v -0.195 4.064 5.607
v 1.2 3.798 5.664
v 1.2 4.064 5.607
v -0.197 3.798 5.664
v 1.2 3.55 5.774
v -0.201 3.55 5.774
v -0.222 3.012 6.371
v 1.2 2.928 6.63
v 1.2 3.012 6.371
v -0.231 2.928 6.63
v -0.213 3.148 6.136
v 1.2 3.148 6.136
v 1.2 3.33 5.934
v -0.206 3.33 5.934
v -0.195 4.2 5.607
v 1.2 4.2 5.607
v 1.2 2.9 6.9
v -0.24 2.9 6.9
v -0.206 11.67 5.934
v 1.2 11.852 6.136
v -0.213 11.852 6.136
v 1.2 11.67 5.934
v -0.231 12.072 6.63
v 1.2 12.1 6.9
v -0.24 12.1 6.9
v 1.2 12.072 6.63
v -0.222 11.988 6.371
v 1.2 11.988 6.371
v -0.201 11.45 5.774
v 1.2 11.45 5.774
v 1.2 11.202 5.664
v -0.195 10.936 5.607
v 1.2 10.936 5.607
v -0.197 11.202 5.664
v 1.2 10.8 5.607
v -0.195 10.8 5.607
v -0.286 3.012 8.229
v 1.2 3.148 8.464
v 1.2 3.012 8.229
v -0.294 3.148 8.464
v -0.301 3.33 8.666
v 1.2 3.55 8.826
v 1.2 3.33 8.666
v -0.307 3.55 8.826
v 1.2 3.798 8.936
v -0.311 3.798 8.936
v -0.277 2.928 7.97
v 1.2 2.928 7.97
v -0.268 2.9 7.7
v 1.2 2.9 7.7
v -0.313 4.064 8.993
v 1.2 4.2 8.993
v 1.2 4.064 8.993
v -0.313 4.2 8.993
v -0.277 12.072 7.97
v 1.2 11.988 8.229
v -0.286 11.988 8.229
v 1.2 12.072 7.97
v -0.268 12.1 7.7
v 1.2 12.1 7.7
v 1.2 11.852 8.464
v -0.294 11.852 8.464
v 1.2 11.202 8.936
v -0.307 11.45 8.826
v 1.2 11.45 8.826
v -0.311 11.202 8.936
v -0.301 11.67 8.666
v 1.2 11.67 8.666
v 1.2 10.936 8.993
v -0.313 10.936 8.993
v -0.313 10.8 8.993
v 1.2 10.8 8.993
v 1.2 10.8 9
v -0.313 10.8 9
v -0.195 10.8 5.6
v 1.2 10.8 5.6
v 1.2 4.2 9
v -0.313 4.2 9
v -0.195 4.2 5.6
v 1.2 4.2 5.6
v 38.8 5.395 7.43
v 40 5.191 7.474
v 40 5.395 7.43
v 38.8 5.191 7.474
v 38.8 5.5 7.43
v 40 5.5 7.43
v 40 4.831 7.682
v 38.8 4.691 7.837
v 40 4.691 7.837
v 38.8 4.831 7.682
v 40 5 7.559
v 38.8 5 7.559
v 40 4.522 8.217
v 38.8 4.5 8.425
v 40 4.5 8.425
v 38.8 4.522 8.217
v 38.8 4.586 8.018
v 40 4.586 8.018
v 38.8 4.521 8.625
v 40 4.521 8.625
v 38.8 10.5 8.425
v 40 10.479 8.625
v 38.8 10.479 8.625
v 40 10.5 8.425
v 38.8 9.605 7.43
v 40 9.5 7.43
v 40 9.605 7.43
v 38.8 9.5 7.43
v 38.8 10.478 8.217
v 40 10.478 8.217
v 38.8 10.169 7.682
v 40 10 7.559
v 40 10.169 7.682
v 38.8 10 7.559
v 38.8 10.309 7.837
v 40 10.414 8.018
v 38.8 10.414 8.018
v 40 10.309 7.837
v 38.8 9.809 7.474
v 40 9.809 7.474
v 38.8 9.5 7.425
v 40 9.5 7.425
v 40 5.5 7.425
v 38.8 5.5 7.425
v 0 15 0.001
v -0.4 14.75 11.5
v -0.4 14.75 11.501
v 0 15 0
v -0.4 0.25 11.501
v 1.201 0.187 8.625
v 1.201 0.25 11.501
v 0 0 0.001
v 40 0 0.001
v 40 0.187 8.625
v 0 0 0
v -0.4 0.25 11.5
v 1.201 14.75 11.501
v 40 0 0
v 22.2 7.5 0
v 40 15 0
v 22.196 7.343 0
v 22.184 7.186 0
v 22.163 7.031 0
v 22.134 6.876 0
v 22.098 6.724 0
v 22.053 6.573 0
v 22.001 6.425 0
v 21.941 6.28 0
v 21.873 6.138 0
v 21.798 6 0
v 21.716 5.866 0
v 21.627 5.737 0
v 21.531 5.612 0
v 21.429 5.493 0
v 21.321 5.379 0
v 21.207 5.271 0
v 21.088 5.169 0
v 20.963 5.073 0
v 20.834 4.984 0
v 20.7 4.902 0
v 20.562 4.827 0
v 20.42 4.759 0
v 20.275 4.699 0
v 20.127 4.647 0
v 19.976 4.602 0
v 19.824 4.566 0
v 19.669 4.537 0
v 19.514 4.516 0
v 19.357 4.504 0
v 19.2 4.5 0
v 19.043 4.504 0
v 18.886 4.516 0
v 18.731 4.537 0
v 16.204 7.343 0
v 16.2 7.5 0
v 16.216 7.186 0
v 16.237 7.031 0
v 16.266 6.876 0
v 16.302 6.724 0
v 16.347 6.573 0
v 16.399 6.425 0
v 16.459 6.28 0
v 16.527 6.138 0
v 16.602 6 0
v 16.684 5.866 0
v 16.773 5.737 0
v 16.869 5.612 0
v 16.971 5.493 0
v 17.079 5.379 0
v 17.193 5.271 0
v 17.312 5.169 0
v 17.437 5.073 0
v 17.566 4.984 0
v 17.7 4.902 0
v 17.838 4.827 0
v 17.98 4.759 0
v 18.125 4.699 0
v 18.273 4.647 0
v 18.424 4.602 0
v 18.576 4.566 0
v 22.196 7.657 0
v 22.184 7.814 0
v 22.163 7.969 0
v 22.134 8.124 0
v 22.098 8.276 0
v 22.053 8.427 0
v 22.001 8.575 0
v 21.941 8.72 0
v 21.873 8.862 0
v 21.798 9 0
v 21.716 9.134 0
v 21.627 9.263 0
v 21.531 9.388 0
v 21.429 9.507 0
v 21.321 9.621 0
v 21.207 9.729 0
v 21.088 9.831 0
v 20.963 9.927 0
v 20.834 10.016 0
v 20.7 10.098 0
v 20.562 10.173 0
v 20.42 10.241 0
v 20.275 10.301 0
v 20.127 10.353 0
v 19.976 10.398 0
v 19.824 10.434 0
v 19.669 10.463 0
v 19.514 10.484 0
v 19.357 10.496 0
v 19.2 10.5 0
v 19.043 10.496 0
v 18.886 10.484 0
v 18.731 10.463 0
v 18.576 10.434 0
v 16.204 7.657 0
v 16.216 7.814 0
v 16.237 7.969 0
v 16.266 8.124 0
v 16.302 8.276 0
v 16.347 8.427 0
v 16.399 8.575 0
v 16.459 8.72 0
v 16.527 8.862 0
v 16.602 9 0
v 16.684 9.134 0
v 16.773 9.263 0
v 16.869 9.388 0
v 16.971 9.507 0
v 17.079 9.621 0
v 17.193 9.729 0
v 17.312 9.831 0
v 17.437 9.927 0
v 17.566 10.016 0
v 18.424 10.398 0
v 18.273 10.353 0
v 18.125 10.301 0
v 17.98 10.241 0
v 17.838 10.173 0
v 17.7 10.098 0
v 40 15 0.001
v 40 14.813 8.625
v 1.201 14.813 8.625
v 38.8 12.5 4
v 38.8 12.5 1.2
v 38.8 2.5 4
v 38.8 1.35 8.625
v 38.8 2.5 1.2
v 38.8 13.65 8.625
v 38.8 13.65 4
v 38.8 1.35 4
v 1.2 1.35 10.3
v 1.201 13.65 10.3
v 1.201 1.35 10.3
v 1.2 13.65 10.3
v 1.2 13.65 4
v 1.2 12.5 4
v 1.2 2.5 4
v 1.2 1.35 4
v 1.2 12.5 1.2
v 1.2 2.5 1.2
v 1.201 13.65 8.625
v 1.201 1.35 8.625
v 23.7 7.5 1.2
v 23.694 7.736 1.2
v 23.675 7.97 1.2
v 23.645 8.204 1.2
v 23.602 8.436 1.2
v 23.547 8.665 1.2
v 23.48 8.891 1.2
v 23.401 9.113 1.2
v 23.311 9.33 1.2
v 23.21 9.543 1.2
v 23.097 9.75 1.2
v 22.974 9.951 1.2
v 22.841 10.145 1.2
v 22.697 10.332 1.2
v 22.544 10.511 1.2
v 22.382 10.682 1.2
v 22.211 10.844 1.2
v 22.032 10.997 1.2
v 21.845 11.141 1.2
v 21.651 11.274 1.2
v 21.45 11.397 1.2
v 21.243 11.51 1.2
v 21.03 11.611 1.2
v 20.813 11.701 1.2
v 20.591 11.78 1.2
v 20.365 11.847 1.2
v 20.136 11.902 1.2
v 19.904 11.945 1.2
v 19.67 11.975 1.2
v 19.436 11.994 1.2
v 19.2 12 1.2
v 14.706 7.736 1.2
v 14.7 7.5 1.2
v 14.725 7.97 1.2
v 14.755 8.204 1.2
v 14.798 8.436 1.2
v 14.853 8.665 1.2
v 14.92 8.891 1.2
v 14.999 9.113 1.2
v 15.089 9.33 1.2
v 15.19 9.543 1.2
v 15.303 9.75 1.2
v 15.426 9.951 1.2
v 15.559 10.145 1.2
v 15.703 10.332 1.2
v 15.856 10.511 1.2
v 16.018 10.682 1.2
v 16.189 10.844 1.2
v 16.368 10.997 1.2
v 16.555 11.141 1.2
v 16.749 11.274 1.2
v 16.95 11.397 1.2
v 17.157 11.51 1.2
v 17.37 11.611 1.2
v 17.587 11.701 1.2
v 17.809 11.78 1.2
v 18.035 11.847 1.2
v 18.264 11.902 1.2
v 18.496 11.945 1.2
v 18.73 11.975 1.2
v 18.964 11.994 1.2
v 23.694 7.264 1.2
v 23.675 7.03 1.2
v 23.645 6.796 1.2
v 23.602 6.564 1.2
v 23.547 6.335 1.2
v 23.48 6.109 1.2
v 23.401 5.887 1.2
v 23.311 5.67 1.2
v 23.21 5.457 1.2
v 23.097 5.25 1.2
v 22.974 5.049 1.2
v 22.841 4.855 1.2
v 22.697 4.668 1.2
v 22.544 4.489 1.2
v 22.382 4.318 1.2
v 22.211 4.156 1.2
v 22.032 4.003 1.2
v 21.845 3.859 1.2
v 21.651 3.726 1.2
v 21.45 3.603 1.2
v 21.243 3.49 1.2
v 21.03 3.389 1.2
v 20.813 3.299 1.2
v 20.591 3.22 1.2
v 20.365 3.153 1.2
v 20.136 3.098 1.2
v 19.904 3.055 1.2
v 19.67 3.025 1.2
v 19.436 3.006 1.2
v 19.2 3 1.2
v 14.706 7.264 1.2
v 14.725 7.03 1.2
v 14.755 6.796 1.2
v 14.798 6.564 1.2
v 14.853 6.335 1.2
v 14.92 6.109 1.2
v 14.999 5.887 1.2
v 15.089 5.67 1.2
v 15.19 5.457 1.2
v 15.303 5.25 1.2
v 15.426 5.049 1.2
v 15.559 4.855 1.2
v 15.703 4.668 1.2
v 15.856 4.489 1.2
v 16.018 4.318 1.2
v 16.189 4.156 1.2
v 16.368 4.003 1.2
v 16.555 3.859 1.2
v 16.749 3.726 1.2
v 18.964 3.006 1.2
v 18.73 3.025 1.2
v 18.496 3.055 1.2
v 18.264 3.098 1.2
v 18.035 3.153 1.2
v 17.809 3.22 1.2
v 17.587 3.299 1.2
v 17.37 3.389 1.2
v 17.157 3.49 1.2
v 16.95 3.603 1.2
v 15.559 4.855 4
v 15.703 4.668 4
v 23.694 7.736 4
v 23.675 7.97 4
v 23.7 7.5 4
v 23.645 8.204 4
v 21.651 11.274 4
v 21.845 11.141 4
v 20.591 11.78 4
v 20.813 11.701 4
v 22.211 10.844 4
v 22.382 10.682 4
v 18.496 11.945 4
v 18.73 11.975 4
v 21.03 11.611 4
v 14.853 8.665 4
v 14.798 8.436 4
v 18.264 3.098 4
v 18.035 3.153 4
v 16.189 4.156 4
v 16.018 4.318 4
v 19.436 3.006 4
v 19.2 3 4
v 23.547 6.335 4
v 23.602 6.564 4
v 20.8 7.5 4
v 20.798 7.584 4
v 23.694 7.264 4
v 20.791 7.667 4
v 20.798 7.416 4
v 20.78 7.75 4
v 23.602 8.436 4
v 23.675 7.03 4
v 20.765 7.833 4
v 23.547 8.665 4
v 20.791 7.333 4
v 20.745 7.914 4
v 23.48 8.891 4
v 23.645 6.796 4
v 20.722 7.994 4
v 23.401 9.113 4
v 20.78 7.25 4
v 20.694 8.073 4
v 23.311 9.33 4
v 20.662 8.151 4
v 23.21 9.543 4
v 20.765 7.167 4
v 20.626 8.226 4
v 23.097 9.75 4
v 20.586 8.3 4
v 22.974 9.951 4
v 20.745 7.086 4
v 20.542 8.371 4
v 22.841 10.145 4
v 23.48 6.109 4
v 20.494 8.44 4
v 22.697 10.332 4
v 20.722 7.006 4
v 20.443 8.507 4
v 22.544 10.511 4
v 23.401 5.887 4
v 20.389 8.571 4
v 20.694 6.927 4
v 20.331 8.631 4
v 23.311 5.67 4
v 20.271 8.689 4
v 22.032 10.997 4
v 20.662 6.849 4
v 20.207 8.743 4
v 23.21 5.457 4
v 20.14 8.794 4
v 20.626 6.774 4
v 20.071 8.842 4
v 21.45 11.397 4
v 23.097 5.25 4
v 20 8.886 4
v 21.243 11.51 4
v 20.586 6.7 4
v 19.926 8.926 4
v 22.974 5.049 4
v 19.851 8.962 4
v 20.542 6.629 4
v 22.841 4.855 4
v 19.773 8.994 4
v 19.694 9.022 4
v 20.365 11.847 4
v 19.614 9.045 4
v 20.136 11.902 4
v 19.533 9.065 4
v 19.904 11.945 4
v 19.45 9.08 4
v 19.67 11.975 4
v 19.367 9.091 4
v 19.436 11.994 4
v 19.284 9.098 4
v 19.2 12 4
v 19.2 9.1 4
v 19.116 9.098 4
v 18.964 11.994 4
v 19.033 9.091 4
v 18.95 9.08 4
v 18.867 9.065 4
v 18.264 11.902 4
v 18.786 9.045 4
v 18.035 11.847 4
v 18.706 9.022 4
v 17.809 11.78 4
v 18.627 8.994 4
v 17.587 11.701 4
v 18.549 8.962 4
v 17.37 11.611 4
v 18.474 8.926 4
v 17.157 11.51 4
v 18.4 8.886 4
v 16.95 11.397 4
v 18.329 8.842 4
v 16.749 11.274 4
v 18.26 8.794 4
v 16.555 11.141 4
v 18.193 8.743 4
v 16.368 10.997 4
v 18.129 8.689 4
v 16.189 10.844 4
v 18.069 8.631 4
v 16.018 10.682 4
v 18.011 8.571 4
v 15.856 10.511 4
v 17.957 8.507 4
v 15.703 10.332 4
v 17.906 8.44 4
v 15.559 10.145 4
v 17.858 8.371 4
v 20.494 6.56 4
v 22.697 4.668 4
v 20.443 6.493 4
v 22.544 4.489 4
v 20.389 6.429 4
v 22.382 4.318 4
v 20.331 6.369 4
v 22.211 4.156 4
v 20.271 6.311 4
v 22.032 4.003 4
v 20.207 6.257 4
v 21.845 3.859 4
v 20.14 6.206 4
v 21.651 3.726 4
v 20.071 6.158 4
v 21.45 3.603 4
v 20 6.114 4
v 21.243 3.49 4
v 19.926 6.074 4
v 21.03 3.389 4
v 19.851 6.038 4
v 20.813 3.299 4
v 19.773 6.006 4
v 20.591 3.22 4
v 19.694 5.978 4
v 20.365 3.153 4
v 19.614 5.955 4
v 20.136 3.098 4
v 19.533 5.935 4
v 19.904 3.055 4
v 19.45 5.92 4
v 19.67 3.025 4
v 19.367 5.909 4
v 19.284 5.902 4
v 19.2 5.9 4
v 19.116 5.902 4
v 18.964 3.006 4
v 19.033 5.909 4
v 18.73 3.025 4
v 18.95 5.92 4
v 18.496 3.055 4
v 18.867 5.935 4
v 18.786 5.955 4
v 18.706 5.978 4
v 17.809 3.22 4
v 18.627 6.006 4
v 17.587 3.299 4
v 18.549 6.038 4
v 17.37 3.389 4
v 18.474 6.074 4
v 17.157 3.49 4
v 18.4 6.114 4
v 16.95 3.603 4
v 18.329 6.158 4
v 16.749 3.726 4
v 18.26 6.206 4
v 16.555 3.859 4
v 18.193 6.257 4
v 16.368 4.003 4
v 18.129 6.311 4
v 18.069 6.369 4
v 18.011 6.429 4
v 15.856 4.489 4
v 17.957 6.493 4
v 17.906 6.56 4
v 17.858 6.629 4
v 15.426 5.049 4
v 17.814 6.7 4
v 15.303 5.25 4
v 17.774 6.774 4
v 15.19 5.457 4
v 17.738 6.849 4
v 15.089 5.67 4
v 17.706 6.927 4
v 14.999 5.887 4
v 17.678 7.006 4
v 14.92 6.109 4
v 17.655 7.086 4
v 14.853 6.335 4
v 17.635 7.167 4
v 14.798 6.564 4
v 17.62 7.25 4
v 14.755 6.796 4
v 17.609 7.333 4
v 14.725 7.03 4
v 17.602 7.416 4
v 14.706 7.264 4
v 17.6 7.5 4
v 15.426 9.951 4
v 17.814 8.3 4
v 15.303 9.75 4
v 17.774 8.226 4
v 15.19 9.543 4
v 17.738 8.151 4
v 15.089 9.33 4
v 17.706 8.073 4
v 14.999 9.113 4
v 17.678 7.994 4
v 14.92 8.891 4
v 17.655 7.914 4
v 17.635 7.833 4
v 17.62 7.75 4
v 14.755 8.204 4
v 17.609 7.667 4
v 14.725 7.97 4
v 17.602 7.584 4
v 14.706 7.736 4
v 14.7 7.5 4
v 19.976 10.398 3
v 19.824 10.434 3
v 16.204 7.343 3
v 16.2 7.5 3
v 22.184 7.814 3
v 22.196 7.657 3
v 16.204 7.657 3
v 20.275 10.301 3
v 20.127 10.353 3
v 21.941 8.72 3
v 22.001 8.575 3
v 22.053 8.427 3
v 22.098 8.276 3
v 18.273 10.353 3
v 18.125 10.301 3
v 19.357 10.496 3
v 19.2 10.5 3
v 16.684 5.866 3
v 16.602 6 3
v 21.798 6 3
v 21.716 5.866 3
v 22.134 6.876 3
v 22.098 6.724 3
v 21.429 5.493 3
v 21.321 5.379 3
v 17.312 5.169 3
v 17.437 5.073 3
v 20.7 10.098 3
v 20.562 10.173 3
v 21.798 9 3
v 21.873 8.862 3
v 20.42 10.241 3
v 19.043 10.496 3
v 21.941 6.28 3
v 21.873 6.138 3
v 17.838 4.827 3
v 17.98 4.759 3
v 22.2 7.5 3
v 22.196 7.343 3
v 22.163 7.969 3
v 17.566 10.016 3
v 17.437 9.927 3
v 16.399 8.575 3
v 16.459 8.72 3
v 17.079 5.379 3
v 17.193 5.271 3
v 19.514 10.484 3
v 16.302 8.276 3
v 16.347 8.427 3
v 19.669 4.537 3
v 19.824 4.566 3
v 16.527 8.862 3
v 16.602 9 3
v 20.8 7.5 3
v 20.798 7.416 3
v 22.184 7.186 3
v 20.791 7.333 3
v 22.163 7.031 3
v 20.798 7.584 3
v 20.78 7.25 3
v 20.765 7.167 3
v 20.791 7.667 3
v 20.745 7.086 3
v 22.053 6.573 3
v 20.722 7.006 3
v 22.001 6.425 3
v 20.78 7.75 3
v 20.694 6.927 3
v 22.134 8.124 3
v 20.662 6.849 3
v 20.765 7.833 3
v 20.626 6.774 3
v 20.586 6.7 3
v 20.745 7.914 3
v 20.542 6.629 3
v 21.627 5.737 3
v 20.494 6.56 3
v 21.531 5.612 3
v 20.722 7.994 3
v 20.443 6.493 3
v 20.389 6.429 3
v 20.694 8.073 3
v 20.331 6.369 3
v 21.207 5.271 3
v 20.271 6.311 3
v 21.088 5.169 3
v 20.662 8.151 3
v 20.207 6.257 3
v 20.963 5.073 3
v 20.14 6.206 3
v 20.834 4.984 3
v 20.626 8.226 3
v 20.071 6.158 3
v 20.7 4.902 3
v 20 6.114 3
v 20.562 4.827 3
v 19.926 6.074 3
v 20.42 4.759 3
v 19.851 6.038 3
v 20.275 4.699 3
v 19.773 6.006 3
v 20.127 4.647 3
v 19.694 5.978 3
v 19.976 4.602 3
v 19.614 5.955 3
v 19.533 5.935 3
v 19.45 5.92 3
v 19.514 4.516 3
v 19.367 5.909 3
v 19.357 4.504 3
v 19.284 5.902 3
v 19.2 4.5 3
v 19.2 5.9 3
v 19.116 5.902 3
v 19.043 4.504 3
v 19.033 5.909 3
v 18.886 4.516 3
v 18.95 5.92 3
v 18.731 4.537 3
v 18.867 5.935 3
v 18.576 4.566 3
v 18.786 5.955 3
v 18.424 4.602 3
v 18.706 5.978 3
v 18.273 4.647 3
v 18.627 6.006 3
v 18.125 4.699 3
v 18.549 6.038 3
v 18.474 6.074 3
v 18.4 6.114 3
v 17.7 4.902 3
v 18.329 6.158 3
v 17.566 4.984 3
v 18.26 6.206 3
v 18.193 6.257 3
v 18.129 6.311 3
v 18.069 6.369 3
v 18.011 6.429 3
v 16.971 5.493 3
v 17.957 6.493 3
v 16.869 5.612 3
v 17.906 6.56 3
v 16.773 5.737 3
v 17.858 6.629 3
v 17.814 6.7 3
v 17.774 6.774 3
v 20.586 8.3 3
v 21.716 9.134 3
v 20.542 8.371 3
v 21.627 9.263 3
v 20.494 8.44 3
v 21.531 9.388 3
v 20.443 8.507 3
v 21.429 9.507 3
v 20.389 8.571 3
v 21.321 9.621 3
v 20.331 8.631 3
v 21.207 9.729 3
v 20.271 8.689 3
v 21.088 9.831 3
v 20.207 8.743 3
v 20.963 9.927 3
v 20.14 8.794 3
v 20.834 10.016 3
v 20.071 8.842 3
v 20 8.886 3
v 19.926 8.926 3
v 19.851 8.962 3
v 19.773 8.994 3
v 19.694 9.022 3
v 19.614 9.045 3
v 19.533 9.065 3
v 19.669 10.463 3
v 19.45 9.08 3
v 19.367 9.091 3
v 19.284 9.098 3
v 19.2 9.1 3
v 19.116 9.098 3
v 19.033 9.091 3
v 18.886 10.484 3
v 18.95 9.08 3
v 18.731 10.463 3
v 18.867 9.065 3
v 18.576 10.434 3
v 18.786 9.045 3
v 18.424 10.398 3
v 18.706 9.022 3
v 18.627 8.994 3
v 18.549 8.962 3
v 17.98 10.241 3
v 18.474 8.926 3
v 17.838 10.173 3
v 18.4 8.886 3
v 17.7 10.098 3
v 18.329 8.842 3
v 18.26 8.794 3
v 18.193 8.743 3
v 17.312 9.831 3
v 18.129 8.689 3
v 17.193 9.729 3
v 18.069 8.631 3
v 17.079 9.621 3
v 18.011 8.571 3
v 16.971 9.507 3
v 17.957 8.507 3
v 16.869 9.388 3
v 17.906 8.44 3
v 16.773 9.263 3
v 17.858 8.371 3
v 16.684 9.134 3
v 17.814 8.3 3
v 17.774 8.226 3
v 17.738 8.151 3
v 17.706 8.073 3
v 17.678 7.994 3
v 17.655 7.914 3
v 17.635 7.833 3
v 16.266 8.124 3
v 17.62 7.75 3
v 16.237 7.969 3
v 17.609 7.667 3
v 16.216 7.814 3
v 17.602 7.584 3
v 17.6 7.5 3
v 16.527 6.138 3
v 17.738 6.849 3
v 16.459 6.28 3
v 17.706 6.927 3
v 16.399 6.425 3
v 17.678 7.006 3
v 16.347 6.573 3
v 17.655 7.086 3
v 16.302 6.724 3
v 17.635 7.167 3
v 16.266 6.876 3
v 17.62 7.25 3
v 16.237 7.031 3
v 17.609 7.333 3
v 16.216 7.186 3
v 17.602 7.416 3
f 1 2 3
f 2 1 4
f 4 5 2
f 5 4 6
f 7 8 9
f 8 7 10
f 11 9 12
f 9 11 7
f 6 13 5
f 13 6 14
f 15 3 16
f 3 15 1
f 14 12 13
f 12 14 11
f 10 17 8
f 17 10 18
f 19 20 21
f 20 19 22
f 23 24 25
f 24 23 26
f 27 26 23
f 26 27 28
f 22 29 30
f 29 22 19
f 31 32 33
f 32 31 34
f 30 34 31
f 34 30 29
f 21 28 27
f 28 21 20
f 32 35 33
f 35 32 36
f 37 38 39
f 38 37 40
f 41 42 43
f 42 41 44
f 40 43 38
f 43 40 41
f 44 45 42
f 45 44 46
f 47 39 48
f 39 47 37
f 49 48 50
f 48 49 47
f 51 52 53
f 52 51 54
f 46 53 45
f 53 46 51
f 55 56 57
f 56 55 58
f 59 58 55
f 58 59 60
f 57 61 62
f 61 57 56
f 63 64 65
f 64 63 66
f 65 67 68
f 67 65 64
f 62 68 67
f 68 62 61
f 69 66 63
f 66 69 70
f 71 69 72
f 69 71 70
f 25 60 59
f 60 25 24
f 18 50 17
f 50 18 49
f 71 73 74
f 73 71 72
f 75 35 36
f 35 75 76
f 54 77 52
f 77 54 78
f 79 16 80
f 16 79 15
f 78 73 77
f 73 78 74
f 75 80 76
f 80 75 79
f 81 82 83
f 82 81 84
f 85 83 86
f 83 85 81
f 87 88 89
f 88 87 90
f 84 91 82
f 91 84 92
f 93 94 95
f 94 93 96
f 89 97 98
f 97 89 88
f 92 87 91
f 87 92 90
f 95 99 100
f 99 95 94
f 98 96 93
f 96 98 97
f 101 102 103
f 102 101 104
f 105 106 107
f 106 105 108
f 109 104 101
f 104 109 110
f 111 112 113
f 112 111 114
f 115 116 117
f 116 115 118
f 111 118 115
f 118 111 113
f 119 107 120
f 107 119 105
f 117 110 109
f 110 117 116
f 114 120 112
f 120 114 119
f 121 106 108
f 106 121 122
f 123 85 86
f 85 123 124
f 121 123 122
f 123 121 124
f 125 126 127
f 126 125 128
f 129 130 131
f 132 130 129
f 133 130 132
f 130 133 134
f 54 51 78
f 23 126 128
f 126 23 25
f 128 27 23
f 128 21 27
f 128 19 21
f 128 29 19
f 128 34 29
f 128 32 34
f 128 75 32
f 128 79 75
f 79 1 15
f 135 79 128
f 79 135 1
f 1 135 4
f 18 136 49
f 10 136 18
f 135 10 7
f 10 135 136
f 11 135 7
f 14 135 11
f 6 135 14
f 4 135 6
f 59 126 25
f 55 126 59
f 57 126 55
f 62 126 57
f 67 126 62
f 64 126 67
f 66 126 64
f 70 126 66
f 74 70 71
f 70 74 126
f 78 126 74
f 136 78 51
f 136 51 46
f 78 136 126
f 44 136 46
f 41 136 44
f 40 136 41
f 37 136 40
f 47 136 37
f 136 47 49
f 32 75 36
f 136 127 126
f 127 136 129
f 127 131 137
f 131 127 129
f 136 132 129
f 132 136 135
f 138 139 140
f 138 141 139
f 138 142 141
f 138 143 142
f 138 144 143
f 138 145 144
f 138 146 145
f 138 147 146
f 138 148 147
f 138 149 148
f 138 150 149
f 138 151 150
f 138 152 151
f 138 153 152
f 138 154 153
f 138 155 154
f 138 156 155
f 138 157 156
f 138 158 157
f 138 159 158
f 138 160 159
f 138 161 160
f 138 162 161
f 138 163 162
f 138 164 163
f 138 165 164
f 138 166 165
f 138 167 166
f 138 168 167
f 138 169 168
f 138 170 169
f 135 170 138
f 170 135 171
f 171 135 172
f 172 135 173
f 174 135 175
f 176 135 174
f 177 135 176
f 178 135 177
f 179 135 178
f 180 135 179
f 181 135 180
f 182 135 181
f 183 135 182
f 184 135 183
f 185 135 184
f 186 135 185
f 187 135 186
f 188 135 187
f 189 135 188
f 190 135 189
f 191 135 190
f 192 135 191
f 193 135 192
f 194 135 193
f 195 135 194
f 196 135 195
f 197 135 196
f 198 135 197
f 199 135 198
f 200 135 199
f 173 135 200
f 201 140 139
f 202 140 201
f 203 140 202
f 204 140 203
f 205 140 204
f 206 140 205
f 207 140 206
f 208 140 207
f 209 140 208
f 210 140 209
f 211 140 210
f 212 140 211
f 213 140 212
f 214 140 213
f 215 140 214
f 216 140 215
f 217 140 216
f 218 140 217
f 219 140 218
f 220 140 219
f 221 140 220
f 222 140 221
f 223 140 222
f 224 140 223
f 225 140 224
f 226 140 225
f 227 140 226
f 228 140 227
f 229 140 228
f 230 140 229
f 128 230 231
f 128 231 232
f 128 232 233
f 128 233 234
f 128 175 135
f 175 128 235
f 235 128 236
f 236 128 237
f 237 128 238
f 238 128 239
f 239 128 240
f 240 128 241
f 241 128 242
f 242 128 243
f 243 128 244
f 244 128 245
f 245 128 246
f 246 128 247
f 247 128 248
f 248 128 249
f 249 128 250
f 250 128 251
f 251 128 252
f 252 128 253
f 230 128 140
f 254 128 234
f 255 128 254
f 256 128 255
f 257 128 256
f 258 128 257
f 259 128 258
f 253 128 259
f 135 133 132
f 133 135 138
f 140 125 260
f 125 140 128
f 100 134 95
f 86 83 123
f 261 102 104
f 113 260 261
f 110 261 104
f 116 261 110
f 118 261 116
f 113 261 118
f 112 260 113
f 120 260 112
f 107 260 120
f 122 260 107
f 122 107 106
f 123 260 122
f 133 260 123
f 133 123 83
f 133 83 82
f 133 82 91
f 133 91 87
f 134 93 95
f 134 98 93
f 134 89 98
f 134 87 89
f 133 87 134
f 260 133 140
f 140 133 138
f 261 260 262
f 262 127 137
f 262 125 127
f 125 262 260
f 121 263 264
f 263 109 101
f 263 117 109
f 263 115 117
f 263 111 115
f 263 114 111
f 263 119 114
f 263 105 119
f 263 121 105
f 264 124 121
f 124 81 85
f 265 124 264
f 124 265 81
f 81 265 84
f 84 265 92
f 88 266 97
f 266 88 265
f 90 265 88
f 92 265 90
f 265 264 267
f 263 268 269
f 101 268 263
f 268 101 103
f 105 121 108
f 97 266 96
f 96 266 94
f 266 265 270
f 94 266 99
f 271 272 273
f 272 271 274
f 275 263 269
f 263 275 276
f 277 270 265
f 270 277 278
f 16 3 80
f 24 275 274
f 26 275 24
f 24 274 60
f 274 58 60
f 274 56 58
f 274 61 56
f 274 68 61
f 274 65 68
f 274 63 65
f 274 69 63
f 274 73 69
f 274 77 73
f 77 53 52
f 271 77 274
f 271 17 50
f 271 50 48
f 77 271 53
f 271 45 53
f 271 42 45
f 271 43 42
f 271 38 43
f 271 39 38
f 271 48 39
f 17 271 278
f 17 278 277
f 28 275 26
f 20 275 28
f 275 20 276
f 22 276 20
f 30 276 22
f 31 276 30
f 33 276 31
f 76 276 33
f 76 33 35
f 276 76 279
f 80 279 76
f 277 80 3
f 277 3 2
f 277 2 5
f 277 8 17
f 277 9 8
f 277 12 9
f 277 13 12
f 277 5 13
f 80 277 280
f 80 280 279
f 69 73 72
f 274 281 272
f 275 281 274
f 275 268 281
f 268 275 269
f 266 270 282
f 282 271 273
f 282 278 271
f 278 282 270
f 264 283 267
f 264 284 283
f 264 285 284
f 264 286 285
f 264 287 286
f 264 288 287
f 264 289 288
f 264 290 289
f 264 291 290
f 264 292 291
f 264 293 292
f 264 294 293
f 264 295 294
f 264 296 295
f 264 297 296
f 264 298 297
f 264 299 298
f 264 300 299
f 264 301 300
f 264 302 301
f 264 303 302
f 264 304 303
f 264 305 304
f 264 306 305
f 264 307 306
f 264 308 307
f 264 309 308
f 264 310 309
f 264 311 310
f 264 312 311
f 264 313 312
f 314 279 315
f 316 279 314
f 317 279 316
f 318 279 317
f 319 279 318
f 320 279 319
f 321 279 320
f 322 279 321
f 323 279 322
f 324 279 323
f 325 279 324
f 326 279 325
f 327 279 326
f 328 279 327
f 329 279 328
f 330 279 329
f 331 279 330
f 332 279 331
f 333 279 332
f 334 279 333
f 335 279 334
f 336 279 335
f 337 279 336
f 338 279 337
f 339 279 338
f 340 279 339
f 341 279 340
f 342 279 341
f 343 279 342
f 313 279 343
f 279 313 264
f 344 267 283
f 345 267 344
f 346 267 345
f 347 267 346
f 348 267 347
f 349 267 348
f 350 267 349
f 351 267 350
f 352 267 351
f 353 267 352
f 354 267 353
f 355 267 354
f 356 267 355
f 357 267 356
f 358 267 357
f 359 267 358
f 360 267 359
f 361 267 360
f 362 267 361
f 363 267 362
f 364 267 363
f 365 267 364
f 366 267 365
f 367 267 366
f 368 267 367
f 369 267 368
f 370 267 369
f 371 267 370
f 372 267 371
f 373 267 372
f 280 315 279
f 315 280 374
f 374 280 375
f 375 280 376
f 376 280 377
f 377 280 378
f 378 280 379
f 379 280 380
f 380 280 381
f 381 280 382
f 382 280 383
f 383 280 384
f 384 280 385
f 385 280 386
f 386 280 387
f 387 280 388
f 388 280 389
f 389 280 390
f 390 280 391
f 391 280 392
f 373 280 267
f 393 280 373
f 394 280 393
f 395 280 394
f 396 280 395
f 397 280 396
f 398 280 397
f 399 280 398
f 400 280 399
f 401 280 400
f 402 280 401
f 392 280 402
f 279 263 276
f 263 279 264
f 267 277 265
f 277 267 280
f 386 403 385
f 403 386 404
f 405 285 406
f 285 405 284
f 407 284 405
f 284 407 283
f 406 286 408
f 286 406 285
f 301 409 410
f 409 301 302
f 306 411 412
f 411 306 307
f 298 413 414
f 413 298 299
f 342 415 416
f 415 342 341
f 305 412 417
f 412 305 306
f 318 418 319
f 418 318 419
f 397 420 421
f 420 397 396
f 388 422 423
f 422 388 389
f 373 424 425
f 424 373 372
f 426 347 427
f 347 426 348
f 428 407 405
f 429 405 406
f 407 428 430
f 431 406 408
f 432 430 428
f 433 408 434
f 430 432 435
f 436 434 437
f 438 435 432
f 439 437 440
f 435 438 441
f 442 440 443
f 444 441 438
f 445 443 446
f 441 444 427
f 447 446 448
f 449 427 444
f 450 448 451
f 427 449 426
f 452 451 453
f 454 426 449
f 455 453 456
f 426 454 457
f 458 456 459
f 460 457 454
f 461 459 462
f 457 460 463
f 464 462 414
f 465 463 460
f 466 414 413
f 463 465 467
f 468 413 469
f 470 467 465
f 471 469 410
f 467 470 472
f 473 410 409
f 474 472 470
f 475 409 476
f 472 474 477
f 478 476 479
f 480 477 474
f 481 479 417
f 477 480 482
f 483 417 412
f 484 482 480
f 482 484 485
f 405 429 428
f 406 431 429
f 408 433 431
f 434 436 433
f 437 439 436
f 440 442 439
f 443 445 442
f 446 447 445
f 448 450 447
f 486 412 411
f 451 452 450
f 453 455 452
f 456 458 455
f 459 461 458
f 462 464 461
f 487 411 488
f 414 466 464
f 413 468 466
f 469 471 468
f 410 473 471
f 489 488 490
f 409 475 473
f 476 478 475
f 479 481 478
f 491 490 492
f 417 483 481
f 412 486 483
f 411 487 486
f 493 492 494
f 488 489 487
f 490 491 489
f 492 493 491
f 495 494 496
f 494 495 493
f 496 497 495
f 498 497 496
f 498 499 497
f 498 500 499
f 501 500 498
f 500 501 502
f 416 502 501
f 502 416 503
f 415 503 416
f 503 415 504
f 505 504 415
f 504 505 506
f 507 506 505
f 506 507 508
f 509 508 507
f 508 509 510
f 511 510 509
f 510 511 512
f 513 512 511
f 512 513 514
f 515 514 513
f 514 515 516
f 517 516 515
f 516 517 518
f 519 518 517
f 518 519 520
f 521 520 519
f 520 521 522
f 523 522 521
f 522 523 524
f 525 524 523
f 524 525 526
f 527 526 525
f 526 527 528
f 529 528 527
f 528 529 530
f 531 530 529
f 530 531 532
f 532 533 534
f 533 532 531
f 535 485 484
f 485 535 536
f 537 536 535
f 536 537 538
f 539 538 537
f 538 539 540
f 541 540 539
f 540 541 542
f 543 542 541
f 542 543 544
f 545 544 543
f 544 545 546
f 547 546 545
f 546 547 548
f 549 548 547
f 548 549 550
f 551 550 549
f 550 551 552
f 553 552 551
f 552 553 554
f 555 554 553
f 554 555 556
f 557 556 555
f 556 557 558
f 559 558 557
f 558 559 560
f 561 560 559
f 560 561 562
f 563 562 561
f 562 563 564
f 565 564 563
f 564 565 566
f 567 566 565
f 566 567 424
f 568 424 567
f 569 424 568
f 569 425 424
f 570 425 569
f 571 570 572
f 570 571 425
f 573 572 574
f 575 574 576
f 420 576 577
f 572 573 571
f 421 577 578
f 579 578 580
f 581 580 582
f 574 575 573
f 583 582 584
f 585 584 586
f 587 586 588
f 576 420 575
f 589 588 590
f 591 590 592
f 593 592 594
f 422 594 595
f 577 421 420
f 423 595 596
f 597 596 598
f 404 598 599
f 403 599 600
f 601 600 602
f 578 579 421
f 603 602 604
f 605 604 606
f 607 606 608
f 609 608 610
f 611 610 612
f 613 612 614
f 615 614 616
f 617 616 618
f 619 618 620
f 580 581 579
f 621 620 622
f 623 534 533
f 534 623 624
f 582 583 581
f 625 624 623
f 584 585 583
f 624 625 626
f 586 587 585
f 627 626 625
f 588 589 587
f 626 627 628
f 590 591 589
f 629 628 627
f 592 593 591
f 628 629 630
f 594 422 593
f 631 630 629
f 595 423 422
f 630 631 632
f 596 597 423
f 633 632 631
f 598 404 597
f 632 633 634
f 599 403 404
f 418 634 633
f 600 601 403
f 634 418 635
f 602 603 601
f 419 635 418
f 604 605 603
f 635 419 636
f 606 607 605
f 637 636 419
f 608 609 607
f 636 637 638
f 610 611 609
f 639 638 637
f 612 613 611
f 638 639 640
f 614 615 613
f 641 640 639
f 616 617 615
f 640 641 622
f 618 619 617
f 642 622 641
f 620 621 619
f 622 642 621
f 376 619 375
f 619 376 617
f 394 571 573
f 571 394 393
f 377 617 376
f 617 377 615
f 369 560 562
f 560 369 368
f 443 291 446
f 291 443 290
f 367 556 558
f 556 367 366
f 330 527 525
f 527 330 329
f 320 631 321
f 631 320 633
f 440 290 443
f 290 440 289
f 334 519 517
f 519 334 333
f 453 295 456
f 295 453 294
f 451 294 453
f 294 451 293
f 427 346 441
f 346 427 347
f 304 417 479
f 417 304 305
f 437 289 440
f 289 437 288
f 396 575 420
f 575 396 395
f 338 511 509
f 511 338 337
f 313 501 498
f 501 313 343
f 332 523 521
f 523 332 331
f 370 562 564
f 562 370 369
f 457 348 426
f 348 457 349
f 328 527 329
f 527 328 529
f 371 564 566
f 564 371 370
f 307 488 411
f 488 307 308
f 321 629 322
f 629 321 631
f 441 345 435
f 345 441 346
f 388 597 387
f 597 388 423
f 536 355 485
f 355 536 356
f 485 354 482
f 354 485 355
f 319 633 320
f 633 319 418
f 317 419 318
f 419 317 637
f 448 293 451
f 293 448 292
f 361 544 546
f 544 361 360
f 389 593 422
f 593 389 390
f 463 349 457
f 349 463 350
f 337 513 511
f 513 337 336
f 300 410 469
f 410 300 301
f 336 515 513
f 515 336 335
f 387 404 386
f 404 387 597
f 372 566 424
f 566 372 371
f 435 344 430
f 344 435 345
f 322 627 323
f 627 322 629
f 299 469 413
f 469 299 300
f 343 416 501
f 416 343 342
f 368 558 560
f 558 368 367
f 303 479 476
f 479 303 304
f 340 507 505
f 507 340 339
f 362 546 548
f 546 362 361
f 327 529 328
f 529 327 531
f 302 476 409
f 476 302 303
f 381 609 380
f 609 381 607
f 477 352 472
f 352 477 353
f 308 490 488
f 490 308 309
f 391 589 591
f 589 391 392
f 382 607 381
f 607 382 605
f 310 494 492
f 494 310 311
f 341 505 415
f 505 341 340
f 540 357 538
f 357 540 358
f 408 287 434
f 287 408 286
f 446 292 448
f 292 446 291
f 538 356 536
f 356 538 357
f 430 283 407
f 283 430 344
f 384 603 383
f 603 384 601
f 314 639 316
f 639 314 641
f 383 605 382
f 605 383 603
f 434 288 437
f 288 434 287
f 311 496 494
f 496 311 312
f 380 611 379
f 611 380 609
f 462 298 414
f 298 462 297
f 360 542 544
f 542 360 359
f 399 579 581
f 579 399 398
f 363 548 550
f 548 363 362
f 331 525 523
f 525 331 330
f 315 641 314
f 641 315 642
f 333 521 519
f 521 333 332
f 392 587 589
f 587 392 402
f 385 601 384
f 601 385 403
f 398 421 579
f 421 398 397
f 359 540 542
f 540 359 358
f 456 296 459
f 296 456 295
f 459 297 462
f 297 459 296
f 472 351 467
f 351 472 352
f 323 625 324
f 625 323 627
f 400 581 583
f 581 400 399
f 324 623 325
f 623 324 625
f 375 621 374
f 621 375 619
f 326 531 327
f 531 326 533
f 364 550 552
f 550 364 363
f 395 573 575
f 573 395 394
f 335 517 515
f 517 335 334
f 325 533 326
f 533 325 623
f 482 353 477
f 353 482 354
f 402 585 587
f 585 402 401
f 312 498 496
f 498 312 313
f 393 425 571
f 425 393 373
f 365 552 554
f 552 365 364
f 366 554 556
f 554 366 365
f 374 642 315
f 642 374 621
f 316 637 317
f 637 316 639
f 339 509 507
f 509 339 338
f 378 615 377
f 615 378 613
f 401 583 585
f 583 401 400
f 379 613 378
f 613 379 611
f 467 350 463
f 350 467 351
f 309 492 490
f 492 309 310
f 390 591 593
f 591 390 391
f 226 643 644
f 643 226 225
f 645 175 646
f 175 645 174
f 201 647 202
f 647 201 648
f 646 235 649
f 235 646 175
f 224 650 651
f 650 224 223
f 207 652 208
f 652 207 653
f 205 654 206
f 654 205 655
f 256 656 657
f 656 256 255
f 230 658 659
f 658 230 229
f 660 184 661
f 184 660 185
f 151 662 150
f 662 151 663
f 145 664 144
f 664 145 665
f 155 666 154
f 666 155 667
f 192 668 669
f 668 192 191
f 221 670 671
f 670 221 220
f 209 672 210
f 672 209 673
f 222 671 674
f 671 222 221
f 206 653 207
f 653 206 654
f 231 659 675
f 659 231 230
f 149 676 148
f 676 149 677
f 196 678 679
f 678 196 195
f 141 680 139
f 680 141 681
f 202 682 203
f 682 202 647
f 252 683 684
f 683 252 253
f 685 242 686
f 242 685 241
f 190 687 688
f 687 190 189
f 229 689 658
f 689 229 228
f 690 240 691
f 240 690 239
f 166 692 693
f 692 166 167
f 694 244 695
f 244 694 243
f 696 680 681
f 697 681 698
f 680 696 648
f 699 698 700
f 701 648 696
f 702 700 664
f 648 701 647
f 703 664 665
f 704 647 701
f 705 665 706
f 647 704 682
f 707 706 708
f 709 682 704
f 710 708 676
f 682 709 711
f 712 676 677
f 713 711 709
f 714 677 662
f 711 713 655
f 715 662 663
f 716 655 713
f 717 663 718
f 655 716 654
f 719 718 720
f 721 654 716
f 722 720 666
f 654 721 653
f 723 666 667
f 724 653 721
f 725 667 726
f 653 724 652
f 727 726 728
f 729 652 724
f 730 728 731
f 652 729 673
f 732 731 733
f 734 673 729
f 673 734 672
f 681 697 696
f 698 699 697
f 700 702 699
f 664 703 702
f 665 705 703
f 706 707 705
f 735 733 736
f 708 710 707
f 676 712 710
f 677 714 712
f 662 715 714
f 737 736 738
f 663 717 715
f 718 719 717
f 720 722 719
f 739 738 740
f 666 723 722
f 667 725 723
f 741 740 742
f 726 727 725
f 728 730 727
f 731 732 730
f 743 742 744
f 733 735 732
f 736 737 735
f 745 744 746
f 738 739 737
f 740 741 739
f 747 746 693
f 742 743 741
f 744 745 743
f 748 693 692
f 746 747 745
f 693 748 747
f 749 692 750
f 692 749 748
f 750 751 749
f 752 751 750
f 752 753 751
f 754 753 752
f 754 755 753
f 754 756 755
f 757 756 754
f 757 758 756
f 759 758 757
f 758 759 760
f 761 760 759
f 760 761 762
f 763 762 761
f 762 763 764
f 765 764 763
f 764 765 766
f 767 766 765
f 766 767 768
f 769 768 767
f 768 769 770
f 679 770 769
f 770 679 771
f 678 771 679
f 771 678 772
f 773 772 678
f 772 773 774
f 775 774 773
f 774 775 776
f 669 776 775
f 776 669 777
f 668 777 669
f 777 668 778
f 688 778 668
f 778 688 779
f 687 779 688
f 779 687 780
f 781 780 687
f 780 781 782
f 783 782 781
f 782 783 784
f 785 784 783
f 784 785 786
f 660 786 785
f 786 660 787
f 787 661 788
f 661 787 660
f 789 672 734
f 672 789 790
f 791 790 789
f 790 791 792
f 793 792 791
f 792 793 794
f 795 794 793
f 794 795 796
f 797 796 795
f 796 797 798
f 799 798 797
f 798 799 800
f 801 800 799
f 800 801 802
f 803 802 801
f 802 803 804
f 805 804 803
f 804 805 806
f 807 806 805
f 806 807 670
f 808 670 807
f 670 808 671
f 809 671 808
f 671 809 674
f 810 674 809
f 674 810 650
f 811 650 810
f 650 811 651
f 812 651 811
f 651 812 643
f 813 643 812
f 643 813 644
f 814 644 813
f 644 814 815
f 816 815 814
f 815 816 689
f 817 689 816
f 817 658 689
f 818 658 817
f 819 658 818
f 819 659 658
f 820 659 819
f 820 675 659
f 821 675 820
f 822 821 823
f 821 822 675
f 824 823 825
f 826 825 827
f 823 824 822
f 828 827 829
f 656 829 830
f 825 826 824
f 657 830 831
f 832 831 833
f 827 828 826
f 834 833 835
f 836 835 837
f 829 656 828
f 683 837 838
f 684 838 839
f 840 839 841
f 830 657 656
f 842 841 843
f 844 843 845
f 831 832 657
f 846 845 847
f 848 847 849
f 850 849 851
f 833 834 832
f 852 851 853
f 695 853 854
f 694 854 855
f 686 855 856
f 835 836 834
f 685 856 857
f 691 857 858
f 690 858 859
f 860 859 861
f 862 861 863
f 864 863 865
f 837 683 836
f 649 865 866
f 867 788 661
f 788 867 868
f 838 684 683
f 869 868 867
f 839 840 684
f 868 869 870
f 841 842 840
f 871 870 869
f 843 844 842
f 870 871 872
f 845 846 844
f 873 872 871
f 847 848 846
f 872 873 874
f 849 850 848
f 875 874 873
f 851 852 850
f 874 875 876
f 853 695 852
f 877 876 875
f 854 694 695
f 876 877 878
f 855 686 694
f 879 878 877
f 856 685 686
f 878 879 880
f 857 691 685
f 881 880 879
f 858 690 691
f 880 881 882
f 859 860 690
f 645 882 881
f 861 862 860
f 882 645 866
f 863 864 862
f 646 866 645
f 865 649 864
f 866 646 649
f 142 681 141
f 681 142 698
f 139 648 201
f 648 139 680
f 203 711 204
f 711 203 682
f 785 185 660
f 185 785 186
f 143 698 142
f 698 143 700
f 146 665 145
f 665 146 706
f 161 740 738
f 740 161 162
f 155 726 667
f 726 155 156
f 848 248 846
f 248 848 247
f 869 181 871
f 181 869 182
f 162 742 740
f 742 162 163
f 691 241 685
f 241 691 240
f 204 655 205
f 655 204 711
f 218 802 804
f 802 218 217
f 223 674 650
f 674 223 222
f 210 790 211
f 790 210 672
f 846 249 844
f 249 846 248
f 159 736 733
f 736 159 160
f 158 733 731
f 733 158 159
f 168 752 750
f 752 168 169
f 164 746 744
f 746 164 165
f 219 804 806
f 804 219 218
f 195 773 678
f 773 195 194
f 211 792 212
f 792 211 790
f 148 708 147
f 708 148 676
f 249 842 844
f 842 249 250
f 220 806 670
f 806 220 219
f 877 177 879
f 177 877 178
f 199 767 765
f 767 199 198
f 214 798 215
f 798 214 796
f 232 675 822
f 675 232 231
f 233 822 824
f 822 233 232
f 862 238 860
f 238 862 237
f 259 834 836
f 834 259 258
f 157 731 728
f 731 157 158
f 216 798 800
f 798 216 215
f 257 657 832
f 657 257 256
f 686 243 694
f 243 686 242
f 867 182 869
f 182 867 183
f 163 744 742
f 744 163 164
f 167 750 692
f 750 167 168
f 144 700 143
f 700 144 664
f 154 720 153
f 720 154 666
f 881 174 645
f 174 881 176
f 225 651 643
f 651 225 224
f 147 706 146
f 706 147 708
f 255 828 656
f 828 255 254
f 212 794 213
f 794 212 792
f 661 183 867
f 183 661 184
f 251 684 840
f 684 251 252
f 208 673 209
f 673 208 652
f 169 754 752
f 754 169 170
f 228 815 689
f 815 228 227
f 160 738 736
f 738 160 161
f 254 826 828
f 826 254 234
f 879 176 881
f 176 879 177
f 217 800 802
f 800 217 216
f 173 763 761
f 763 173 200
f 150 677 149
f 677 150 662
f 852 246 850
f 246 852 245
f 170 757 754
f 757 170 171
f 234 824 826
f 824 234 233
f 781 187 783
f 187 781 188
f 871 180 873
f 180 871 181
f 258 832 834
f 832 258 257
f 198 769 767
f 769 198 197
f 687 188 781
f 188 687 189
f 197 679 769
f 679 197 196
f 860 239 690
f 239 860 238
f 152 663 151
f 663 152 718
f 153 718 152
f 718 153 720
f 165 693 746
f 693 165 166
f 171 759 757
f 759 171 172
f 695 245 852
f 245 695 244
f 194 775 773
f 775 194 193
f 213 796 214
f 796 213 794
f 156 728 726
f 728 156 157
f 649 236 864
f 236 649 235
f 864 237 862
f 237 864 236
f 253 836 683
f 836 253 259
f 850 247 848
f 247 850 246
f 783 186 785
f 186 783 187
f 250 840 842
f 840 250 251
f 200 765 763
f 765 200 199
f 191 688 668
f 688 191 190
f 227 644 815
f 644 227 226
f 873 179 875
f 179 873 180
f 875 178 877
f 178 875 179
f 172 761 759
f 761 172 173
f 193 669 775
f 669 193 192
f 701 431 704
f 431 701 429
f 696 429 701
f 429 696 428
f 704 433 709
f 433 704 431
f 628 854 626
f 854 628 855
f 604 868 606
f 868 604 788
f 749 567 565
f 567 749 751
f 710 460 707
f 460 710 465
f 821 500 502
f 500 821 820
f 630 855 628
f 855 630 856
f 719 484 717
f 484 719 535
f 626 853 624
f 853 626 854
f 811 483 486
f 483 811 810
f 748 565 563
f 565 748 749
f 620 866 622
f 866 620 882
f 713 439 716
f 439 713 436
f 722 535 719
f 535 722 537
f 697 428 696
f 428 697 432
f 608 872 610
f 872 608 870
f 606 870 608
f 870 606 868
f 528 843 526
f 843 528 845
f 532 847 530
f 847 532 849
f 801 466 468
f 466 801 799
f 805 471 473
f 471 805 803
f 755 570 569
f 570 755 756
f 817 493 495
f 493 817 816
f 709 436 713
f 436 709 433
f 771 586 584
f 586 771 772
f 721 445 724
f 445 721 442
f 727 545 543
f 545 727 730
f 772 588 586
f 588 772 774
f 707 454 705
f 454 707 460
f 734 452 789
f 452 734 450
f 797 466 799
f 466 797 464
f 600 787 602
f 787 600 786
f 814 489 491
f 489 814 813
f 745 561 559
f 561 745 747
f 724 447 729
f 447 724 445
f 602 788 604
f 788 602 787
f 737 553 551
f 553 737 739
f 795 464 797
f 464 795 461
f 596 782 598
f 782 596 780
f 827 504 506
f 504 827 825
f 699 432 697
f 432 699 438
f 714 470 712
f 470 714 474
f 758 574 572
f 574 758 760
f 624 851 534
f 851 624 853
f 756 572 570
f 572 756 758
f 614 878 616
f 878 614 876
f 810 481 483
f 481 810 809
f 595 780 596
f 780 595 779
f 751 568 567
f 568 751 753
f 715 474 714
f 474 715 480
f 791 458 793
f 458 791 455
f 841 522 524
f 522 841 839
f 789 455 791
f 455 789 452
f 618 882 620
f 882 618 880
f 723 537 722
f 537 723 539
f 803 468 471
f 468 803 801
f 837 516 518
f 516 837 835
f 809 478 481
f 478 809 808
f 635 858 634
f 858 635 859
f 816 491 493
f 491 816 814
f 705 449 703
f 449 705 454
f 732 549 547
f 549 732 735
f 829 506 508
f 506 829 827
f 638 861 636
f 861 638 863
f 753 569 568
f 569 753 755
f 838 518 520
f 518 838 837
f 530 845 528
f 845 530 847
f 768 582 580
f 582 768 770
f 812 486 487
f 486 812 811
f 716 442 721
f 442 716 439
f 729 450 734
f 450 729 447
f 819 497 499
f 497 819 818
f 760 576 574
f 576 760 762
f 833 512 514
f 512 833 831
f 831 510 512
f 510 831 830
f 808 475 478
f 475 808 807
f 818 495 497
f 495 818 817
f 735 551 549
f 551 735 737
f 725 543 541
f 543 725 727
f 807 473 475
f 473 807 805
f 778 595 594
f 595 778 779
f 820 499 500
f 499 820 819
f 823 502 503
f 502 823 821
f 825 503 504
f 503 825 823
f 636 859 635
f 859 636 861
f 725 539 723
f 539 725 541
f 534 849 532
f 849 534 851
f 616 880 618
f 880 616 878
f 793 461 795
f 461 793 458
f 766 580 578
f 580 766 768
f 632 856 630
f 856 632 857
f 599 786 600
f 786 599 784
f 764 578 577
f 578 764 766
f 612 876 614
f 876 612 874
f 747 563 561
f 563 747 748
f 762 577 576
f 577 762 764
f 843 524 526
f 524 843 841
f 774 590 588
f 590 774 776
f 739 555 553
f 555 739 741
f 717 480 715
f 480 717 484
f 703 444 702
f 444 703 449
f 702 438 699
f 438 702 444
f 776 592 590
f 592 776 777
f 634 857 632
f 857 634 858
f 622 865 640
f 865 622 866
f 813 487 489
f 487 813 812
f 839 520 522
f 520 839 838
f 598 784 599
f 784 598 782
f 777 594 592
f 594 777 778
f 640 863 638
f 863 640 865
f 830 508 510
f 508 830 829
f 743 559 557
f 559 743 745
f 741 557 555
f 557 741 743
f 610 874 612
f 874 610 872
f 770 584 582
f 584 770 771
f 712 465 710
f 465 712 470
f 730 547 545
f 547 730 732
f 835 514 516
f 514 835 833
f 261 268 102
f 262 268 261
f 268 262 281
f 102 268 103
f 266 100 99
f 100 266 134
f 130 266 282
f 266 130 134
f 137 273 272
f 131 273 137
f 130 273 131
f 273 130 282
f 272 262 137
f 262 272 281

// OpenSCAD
pcb_length = 35;
pcb_width = 12;
pcb_hole = 18;
pcb_thickness = 1.6;

module rounded_rect(uw, uh, ul, ur, fn) {
    union() {
        translate([ur, ur, 0]) {
            cylinder(h=ul, r=ur, center=false, $fn=fn);
        }
        translate([uw-ur, ur, 0]) {
            cylinder(h=ul, r=ur, center=false, $fn=fn);
        }
        translate([ur, uh-ur, 0]) {
            cylinder(h=ul, r=ur, center=false, $fn=fn);
        }
        translate([uw-ur, uh-ur, 0]) {
            cylinder(h=ul, r=ur, center=false, $fn=fn);
        }
        translate([0, ur, 0]) {
            cube([uw, uh-2*ur, ul]);
        }
        translate([ur, 0, 0]) {
            cube([uw-2*ur, uh, ul]);
        }
    }
}

module usbport() {
    // The PCB
    difference() {
        cube([pcb_length, pcb_width, pcb_thickness]);
        
        translate([pcb_hole, 6, 0.8]) {
            cylinder(h=4, d=3.2, center=true, $fn=16);
        }
    }
    
    // The USB C Port
    uw = 8.94;
    translate([-1, (pcb_width-uw)/2, pcb_thickness]) {
        rotate([90, 0, 90]) {
            rounded_rect(uw, 3.26, 7.35, (3.26 - 0.7) / 2, 16);
        }
    }
    
}


module nes_bottom() {
    nw = 270;
    nl = 240;
    nh = 50;
    difference() {
        // The full bottom
        cube([nl, nw, nh]);
        
        // The 2 degree tapers on the front and back
        translate([0, -5, nh]) {
            mirror([1, 0, 0]) {
                rotate([0, 92, 0]) {
                    cube([55, nw+10, 10]);
                }
            }
        }
        translate([nl, -5, nh]) {
            rotate([0, 92, 0]) {
                cube([55, nw+10, 10]);
            }
        }
        
        // the 22 degree tapers on the left and right
        translate([-5, 0, nh-12]) {
            mirror([0, 0, 1]) {
                rotate([68, 0, 0]) {
                    cube([nl+10, 50, 25]);
                }
            }
        }
        translate([-5, nw, nh-12]) {
            mirror([0, 0, 0]) {
                rotate([68+180, 0, 0]) {
                    cube([nl+10, 50, 25]);
                }
            }
        }
        
        // the bottom slot
        hull() {
            translate([0, 101, -0.1]) {
                cube([100, 16.5, 0.1]);
                translate([0, 0.25, 12.6]) {
                    cube([100, 16, 0.1]);
                }
            }
        }
    }
}


// Approx outer box dimensions
enc_length = 40;
enc_width = 15;
enc_height = 11.5;

// Inner box dimensions
wall_size = 1.2; // front and back
// width uses 'pcb_width'
pcb_off = 0.15;
inner_width = pcb_width + pcb_off * 2;
pcb_ledge = 1;
ledge_width = pcb_width - pcb_ledge * 2;

pcb_height = 4;

module threaded_insert() {
    h = 4;
    v = tan(8) * h;
    cylinder(h=h, r1=2.525 + v/2, r2=2.525 - v/2, $fn=30);
}

cut_height = enc_height *3/4;

module enc() {
    // distance to expand top of box forward to match the slight NES angle
    front_off = 0.4;
    // distance to shrink top inwards to match the NES angle
    top_off = 0.5;
    
    // outside boundary
    difference() {
        union() {
            difference() {
                // the main outside area
                hull() {
                    cube([enc_length, enc_width, 0.001]);
                    translate([-front_off, top_off / 2, enc_height]) {
                        cube([enc_length + front_off, enc_width-top_off, 0.001]);
                    }
                }
                // Upper inner section
                translate([wall_size, (enc_width-inner_width) / 2, pcb_height]) {
                    cube([enc_length-wall_size*2, inner_width, enc_height-(pcb_height + wall_size)]);
                }
                // Lower inner section
                translate([wall_size, (enc_width-ledge_width) / 2, wall_size]) {
                    cube([enc_length-wall_size*2, ledge_width, enc_height-(pcb_height + wall_size)]);
                }

                // The front usb port
                uw = 9.2;
                uh = 3.4;
                translate([-1, (enc_width-uw)/2, pcb_height + pcb_thickness]) {
                    rotate([90, 0, 90]) {
                        rounded_rect(uw, uh, 7.35, (uh - 0.8) / 2, 30);
                    }
                }
                // The back port
                bw = 6;
                bh = 2;
                translate([enc_length-wall_size - 1, (enc_width-bw)/2,
                    cut_height - bh/2 + -0.2]) {
                    rotate([90, 0, 90]) {
                        rounded_rect(bw, bh, 7.35, bh / 2, 30);
                    }
                }
            }
            
            // under pcb hole support
            support_r = 4.5;
            translate([pcb_hole + wall_size, enc_width/2, 0]) {
                cylinder(h=pcb_height, r=support_r, center=false, $fn=120);
            }
            
            // above pcb threaded insert
            translate([pcb_hole + wall_size, enc_width/2, pcb_height + pcb_thickness]) {
                difference() {
                    cylinder(h=enc_height - pcb_height - pcb_thickness, r=support_r, center=false, $fn=120);
                    translate([0, 0, -0.001]) {
                        threaded_insert();
                    }
                }
            }
            
        }
        // The slot for the screw head
        translate([pcb_hole + wall_size, enc_width/2, -0.1]) {
            cylinder(h=3.1, r=3, $fn=120);
        }
        // The screw hole
        translate([pcb_hole + wall_size, enc_width/2, -0.1]) {
            cylinder(h=pcb_height + 0.2, r=1.6, $fn=120);
        }
    }
}

module cutter() {
    union() {
        // The main split into two
        translate([wall_size+0.001, -10, cut_height]) {
            cube([enc_length, enc_width+20, enc_height]);
        }
        
        // cut out for a kinda snap together lip? maybe too thin
        /*
        translate([wall_size + 0.001, wall_size / 2 + 0.3, enc_height * 3/4 - 0.4]){
            cube([enc_length - wall_size * 2 + wall_size * 0.5, 
            enc_width - wall_size - 0.6, 10]);
        }
        */
        
        // to support the above pcb threaded insert
        translate([pcb_hole + wall_size - 5, enc_width/2 - 5, pcb_height + pcb_thickness / 2]) {
            cube(10);
        }
    }
}

/*
rotate([-90, 0, 0]) {
*/

//translate([wall_size, (enc_width-pcb_width) / 2, pcb_height]) usbport();
//translate([-1.8, -101.7, 0]) nes_bottom();

/*
translate([0, 40, enc_height]) {
    rotate([180, 0, 0]) {
        intersection() {
            enc();
            cutter();
        }
    }
}
*/

difference() {
    enc();
    cutter();
}


//cutter();
/*
}
*/
